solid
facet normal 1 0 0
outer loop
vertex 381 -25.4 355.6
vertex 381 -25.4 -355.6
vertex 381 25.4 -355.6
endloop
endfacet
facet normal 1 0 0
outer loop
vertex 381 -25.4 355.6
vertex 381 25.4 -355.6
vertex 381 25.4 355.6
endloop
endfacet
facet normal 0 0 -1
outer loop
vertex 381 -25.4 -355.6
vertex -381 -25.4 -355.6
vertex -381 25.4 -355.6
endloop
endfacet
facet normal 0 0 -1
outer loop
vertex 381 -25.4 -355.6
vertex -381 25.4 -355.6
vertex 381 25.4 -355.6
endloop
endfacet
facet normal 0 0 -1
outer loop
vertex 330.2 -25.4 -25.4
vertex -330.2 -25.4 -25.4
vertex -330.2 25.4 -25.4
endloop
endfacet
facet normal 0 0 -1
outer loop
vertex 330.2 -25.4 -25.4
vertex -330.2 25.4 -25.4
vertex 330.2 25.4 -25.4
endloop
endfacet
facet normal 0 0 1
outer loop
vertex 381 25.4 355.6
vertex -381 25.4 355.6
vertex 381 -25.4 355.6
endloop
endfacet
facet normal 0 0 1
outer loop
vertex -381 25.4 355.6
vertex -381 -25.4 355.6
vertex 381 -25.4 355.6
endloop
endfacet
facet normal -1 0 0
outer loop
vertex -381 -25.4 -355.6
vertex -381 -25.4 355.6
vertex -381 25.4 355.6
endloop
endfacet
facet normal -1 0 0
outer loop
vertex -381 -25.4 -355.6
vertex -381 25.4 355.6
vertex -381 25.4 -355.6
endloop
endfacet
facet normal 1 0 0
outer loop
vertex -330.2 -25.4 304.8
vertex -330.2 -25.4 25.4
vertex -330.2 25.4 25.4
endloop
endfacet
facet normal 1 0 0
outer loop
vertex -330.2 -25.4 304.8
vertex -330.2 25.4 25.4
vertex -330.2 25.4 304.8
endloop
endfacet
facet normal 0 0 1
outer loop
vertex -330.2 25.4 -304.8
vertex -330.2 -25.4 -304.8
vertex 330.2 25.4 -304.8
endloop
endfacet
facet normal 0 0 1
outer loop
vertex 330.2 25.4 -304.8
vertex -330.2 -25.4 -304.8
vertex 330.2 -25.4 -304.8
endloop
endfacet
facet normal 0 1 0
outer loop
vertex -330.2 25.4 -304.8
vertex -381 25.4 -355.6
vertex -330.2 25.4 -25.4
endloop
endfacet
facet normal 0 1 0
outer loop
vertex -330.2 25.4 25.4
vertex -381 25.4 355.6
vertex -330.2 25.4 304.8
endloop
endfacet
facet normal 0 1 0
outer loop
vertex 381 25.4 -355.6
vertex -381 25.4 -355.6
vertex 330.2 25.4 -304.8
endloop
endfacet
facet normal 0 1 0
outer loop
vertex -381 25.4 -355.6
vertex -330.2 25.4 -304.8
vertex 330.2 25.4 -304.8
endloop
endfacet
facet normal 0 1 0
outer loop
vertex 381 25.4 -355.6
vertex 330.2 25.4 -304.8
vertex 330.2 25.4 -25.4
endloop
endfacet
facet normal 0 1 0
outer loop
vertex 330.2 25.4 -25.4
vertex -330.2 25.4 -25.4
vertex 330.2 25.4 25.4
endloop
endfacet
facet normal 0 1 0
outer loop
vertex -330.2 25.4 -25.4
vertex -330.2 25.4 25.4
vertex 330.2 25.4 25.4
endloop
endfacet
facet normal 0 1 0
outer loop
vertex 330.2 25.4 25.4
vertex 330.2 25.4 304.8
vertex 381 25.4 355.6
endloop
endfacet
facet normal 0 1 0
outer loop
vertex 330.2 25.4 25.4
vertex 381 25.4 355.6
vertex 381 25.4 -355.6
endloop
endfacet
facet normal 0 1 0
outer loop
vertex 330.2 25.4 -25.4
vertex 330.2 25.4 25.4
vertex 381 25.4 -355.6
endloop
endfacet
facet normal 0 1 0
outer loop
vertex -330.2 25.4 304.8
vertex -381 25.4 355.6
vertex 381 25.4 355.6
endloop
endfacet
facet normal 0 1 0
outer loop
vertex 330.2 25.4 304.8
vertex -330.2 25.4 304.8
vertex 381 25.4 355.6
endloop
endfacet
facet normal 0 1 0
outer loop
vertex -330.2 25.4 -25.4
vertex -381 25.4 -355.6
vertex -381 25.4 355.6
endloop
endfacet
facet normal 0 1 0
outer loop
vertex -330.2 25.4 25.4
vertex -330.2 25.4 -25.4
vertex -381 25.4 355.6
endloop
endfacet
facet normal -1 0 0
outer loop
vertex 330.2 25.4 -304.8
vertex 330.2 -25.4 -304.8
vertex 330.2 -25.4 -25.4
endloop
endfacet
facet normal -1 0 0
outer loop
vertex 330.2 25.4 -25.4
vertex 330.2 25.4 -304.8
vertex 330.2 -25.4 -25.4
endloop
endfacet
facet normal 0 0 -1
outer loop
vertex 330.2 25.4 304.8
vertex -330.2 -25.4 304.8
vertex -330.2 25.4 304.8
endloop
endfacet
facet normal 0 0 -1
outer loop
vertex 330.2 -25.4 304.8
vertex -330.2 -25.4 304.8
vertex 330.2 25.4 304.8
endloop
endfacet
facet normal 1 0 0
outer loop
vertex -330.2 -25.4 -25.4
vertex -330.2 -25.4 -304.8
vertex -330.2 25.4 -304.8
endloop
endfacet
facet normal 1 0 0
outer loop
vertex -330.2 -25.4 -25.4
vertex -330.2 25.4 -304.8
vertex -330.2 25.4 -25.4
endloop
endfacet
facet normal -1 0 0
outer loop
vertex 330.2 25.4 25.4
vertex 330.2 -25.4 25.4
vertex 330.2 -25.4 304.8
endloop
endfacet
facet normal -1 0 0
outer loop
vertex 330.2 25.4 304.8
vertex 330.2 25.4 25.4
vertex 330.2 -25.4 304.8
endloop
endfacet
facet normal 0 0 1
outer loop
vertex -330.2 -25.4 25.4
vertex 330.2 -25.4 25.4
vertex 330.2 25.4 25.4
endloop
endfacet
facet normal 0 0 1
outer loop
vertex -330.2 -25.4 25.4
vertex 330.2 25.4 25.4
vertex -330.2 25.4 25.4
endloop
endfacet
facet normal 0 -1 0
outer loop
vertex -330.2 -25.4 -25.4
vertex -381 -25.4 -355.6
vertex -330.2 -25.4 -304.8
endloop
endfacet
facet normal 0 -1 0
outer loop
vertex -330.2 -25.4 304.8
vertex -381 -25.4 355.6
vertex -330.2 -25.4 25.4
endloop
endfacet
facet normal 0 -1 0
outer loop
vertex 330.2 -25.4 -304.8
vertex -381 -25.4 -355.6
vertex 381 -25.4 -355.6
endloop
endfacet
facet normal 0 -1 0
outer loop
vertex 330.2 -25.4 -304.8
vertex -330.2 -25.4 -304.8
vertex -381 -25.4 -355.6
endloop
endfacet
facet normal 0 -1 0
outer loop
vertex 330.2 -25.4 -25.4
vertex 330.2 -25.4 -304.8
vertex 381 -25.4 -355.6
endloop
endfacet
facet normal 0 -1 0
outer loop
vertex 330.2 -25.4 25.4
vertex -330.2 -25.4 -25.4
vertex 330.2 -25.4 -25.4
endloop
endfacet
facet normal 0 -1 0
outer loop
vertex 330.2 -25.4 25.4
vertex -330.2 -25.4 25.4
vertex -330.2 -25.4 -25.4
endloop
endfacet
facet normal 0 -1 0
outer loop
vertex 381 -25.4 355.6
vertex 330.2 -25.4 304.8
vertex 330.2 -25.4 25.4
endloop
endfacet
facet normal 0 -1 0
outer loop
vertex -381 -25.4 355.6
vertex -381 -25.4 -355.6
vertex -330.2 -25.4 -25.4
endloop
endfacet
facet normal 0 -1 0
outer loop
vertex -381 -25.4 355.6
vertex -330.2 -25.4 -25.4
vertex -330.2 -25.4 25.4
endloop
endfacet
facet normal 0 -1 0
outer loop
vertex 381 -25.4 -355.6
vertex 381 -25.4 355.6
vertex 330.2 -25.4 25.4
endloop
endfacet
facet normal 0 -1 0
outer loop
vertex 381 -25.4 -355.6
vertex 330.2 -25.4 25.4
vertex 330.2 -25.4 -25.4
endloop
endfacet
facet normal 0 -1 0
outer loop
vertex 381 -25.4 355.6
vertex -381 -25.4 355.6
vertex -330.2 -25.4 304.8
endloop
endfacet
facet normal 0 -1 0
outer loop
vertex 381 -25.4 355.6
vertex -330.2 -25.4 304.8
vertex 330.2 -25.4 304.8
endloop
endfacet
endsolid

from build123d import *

# Parameters (mm, degrees)
F0_W     = 762
F0_H     = 711.2
F0_W_2   = 660.4
F0_H_2   = 609.6
F1_DEPTH = 25.4
F3_DEPTH = 25.4


with BuildPart() as f1:
    # F0 (on Front) → F1 (new body, symmetric)
    with BuildSketch(Plane.XZ):
        Rectangle(F0_W, F0_H)
        Rectangle(F0_W_2, F0_H_2, mode=Mode.SUBTRACT)
    extrude(amount=F1_DEPTH, both=True)

    # F2 (on Front) → F3 (join, symmetric)
    with BuildSketch(Plane.XZ):
        Polygon((-381, 25.4), (-381, 0), (-381, -25.4), (381, -25.4), (381, 0), (381, 25.4), align=None)
    extrude(amount=F3_DEPTH, both=True)


solid = f1.part
